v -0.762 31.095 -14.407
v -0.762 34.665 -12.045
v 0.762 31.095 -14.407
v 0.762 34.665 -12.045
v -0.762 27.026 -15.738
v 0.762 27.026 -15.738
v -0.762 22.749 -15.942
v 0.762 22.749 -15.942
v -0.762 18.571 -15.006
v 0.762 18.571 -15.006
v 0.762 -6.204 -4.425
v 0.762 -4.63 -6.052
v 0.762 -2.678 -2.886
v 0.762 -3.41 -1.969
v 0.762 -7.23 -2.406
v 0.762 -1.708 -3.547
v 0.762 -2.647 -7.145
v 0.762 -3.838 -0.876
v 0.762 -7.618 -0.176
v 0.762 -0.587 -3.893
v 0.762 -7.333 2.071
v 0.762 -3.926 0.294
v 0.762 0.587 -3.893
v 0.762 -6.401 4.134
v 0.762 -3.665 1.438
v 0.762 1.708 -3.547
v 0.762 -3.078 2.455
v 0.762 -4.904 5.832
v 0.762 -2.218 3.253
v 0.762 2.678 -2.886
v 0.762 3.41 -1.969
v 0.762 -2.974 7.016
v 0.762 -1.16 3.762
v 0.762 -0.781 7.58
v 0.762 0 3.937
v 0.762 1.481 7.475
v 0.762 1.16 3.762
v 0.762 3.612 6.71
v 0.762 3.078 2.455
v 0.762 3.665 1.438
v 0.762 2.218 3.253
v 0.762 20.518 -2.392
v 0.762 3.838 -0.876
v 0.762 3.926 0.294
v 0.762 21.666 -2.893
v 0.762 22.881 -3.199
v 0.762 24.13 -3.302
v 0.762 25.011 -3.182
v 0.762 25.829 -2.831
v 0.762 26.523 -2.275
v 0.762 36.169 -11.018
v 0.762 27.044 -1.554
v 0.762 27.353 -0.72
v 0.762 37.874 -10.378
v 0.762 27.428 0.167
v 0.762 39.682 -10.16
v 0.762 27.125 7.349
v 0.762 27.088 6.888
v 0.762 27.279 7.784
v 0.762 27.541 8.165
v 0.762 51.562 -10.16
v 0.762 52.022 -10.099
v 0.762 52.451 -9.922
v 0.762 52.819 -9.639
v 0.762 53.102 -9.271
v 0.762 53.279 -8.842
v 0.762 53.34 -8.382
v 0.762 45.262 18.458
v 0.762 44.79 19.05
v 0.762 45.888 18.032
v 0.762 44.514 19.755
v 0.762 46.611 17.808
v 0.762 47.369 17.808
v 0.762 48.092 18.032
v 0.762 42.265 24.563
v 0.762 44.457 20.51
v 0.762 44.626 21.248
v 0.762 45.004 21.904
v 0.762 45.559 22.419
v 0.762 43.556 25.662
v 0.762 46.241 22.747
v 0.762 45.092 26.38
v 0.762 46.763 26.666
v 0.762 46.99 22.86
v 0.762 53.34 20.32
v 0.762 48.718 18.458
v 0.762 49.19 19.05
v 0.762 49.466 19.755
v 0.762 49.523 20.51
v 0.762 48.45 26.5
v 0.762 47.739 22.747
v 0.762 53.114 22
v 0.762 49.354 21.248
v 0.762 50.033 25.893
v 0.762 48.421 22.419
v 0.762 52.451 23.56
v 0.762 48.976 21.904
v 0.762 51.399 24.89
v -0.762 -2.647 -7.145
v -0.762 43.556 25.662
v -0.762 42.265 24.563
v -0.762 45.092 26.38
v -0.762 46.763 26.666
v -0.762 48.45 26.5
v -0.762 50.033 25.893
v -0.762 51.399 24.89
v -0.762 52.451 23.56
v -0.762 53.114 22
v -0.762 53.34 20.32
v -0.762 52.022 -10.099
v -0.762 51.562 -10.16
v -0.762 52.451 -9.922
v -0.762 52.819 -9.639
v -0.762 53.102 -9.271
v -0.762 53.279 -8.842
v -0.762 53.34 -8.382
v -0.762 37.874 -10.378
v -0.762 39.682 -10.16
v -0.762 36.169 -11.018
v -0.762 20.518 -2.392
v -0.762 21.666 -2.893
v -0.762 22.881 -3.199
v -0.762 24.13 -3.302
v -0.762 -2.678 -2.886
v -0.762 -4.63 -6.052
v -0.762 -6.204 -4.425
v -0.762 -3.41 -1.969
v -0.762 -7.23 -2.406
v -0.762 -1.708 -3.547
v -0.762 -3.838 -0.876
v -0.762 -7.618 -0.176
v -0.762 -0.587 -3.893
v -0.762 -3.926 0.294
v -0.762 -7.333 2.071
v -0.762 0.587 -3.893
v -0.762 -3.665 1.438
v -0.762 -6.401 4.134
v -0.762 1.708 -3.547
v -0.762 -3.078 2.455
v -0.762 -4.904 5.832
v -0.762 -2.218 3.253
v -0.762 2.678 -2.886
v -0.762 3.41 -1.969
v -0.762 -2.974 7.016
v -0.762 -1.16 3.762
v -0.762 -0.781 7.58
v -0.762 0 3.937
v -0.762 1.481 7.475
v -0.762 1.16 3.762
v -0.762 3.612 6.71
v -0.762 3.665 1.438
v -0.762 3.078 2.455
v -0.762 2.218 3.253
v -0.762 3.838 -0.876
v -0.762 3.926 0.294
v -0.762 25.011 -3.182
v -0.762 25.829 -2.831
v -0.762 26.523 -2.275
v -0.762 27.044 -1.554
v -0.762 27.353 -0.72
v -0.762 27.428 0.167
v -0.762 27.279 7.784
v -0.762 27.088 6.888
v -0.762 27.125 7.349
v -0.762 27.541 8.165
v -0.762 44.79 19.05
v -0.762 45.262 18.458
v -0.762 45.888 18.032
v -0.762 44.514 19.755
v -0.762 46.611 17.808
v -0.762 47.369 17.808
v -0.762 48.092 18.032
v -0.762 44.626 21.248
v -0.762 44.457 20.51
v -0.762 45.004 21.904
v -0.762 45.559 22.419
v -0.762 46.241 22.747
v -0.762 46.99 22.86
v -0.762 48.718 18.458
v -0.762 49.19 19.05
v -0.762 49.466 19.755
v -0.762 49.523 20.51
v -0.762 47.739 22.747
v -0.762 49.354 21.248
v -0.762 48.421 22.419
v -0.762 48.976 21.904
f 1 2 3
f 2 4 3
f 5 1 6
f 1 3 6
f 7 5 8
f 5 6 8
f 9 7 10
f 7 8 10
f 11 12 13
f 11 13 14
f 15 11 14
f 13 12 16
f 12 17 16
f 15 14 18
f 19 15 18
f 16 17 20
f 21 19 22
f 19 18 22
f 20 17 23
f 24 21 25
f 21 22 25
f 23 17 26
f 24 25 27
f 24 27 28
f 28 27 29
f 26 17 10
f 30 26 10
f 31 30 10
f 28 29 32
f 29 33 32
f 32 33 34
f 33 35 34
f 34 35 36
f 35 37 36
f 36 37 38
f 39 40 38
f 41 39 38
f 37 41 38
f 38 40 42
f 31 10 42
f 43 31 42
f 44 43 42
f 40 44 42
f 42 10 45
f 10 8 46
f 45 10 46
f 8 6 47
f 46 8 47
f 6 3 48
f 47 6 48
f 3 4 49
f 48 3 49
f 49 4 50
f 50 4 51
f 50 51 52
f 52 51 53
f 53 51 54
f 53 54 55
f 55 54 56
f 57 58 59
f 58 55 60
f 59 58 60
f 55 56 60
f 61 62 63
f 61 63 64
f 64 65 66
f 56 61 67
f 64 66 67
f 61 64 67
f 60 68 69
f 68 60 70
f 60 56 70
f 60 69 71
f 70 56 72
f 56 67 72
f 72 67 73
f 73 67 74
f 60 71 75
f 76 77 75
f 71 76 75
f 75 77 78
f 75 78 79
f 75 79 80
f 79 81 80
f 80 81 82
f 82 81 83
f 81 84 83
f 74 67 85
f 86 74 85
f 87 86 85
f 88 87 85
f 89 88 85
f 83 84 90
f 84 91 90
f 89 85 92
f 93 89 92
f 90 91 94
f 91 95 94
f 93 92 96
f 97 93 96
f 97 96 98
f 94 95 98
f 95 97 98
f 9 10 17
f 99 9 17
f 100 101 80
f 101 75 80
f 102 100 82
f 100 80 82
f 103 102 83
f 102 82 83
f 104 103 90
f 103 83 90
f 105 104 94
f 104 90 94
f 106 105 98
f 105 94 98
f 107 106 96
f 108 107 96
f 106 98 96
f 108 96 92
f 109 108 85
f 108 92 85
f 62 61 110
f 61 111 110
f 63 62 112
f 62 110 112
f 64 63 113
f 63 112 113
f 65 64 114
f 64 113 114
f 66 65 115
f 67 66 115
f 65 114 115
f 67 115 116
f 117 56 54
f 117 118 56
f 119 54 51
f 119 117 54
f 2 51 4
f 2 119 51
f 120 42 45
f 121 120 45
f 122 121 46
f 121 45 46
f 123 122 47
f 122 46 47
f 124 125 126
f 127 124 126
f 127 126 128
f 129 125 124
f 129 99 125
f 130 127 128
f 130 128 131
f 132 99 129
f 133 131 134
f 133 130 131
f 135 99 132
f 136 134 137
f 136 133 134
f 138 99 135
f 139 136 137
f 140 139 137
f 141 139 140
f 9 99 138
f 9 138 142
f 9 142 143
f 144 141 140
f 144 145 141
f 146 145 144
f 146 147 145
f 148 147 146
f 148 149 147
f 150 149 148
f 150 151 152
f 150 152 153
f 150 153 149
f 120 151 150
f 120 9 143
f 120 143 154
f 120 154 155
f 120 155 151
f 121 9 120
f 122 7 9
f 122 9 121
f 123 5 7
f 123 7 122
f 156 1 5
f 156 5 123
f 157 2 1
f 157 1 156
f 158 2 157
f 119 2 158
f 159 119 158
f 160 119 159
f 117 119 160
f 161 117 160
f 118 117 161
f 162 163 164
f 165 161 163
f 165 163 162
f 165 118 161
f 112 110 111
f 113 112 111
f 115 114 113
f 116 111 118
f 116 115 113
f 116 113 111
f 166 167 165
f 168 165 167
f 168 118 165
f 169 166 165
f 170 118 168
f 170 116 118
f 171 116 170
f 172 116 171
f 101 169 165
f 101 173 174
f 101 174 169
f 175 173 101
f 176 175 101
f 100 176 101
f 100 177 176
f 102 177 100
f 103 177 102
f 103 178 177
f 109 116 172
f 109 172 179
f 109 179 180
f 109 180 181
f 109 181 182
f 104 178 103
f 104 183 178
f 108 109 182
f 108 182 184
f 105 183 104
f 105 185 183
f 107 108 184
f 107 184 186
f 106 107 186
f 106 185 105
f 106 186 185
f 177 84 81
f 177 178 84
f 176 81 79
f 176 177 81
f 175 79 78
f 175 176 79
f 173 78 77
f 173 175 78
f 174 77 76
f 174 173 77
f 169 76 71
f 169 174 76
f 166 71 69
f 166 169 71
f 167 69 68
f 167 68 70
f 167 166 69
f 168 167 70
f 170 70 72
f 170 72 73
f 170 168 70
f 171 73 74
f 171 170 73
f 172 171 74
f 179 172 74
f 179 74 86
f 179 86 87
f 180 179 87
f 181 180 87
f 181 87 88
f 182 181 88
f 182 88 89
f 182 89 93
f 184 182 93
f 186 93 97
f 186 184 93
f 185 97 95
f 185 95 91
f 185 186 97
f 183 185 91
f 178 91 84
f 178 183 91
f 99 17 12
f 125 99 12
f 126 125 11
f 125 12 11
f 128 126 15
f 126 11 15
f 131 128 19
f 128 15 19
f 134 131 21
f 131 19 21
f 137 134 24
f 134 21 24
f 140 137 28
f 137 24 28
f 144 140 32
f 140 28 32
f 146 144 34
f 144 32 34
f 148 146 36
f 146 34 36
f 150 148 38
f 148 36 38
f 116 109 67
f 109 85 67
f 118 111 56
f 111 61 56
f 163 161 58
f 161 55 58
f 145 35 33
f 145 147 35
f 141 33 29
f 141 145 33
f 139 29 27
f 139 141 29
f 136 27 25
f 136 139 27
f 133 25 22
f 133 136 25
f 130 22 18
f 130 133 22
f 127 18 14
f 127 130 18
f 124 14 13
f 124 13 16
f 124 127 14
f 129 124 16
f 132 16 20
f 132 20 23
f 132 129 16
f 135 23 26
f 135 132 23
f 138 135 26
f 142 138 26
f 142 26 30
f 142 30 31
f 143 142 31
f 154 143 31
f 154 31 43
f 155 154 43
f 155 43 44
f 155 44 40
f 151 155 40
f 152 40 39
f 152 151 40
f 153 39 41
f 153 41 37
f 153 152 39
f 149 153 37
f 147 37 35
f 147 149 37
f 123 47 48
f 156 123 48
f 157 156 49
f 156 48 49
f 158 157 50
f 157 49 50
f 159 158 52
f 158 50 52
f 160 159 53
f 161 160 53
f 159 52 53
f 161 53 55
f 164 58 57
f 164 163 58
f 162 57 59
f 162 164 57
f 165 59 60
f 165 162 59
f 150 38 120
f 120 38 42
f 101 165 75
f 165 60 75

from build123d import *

# Parameters (mm, degrees)
SKETCH1_R           = 3.937
SKETCH1_R_2         = 2.54
BOSS_EXTRUDE1_DEPTH = 0.762
FILLET1_R           = 1.778
FILLET2_R           = 7.62


with BuildPart() as part:
    # Sketch1 → Boss-Extrude1 (new, symmetric)
    with BuildSketch(Plane(origin=(0, 0, 0), x_dir=(0, 0, -1), z_dir=(1, 0, 0))):
        with BuildLine():
            Line((-0.16671433, 27.427788703), (-7.62, 27.051))
            Line((-7.62, 27.051), (-24.562678082, 42.265364279))
            ThreePointArc((-24.562678082, 42.265364279), (-26.249752812, 49.261680344), (-20.32, 53.34))
            Line((-20.32, 53.34), (10.16, 53.34))
            Line((10.16, 53.34), (10.16, 36.49278302))
            ThreePointArc((10.16, 36.49278302), (15.447327881, 28.30660931), (15.005535214, 18.571410526))
            Line((15.005535214, 18.571410526), (7.145492959, -2.646947368))
            ThreePointArc((7.145492959, -2.646947368), (-3.137043416, -6.94430404), (-6.709547814, 3.611975654))
            Line((-6.709547814, 3.611975654), (2.391547814, 20.518024346))
            ThreePointArc((2.391547814, 20.518024346), (3.070881997, 22.267522395), (3.302, 24.13))
            ThreePointArc((3.302, 24.13), (2.275160794, 26.523083233), (-0.16671433, 27.427788703))
        make_face()
        with Locations(Location((0, 0, 0), (0, 0, 180))):
            Circle(SKETCH1_R, mode=Mode.SUBTRACT)
        with Locations(Location((-20.32, 46.99, 0), (0, 0, 180))):
            Circle(SKETCH1_R_2, mode=Mode.SUBTRACT)
    extrude(amount=BOSS_EXTRUDE1_DEPTH, both=True)

    # Fillet1
    fillet1_edges = [part.edges().sort_by_distance(p)[0] for p in [
        (0, 27.051, 7.62),
        (0, 53.34, -10.16),
    ]]
    fillet(fillet1_edges, radius=FILLET1_R)

    # Fillet2
    fillet2_edges = [part.edges().sort_by_distance(p)[0] for p in [
        (0, 36.49278302, -10.16),
    ]]
    fillet(fillet2_edges, radius=FILLET2_R)


solid = part.part
